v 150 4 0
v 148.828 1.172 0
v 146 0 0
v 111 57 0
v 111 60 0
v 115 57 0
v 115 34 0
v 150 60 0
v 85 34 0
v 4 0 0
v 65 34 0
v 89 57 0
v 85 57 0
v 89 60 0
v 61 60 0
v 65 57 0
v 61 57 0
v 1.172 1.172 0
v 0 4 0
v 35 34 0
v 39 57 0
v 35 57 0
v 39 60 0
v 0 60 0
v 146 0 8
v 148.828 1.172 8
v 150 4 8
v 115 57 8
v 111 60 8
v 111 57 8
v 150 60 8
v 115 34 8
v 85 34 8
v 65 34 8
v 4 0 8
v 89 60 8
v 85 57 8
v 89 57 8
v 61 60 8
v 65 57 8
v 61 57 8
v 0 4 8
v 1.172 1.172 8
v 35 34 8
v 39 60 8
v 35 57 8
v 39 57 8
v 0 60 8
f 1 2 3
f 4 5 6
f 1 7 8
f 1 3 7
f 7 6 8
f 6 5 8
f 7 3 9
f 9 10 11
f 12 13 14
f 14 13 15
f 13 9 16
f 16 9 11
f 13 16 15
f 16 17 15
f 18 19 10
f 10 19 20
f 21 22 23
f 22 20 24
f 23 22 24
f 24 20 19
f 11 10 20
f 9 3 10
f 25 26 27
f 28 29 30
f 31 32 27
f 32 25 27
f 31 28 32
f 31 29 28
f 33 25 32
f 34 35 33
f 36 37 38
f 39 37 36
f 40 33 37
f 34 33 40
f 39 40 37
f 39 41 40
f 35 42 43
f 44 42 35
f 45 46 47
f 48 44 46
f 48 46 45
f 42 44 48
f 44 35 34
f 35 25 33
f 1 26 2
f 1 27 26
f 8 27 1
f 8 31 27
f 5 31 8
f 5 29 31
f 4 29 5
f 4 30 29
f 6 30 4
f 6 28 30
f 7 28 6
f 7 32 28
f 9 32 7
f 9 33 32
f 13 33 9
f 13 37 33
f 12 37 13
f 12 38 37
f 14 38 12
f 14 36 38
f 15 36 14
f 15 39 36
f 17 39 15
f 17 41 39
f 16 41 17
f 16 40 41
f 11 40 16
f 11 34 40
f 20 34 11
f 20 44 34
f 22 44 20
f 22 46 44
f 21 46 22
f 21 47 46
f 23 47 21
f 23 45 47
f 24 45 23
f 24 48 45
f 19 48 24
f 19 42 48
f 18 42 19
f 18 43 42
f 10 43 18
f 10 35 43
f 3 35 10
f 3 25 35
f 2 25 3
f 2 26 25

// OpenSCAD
$fn = 32;

// ----------------------------------------------------------------------
// Oversize slot bar: 150 mm bar with 2 oversize windows
// ----------------------------------------------------------------------

// --- parameters (mm) ---
profile_height = 8;       // extrusion height
profile_points = 24;      // points of the closed outline

profile = [[0, 4], [1.172, 1.172], [4, 0], [146, 0], [148.828, 1.172], [150, 4], [150, 60], [111, 60], [111, 57], [115, 57], [115, 34], [85, 34], [85, 57], [89, 57], [89, 60], [61, 60], [61, 57], [65, 57], [65, 34], [35, 34], [35, 57], [39, 57], [39, 60], [0, 60]];  // single closed polygon, 24 points, counter clockwise

// --- the one profile operation ---
linear_extrude(height = profile_height) polygon(points = profile);
